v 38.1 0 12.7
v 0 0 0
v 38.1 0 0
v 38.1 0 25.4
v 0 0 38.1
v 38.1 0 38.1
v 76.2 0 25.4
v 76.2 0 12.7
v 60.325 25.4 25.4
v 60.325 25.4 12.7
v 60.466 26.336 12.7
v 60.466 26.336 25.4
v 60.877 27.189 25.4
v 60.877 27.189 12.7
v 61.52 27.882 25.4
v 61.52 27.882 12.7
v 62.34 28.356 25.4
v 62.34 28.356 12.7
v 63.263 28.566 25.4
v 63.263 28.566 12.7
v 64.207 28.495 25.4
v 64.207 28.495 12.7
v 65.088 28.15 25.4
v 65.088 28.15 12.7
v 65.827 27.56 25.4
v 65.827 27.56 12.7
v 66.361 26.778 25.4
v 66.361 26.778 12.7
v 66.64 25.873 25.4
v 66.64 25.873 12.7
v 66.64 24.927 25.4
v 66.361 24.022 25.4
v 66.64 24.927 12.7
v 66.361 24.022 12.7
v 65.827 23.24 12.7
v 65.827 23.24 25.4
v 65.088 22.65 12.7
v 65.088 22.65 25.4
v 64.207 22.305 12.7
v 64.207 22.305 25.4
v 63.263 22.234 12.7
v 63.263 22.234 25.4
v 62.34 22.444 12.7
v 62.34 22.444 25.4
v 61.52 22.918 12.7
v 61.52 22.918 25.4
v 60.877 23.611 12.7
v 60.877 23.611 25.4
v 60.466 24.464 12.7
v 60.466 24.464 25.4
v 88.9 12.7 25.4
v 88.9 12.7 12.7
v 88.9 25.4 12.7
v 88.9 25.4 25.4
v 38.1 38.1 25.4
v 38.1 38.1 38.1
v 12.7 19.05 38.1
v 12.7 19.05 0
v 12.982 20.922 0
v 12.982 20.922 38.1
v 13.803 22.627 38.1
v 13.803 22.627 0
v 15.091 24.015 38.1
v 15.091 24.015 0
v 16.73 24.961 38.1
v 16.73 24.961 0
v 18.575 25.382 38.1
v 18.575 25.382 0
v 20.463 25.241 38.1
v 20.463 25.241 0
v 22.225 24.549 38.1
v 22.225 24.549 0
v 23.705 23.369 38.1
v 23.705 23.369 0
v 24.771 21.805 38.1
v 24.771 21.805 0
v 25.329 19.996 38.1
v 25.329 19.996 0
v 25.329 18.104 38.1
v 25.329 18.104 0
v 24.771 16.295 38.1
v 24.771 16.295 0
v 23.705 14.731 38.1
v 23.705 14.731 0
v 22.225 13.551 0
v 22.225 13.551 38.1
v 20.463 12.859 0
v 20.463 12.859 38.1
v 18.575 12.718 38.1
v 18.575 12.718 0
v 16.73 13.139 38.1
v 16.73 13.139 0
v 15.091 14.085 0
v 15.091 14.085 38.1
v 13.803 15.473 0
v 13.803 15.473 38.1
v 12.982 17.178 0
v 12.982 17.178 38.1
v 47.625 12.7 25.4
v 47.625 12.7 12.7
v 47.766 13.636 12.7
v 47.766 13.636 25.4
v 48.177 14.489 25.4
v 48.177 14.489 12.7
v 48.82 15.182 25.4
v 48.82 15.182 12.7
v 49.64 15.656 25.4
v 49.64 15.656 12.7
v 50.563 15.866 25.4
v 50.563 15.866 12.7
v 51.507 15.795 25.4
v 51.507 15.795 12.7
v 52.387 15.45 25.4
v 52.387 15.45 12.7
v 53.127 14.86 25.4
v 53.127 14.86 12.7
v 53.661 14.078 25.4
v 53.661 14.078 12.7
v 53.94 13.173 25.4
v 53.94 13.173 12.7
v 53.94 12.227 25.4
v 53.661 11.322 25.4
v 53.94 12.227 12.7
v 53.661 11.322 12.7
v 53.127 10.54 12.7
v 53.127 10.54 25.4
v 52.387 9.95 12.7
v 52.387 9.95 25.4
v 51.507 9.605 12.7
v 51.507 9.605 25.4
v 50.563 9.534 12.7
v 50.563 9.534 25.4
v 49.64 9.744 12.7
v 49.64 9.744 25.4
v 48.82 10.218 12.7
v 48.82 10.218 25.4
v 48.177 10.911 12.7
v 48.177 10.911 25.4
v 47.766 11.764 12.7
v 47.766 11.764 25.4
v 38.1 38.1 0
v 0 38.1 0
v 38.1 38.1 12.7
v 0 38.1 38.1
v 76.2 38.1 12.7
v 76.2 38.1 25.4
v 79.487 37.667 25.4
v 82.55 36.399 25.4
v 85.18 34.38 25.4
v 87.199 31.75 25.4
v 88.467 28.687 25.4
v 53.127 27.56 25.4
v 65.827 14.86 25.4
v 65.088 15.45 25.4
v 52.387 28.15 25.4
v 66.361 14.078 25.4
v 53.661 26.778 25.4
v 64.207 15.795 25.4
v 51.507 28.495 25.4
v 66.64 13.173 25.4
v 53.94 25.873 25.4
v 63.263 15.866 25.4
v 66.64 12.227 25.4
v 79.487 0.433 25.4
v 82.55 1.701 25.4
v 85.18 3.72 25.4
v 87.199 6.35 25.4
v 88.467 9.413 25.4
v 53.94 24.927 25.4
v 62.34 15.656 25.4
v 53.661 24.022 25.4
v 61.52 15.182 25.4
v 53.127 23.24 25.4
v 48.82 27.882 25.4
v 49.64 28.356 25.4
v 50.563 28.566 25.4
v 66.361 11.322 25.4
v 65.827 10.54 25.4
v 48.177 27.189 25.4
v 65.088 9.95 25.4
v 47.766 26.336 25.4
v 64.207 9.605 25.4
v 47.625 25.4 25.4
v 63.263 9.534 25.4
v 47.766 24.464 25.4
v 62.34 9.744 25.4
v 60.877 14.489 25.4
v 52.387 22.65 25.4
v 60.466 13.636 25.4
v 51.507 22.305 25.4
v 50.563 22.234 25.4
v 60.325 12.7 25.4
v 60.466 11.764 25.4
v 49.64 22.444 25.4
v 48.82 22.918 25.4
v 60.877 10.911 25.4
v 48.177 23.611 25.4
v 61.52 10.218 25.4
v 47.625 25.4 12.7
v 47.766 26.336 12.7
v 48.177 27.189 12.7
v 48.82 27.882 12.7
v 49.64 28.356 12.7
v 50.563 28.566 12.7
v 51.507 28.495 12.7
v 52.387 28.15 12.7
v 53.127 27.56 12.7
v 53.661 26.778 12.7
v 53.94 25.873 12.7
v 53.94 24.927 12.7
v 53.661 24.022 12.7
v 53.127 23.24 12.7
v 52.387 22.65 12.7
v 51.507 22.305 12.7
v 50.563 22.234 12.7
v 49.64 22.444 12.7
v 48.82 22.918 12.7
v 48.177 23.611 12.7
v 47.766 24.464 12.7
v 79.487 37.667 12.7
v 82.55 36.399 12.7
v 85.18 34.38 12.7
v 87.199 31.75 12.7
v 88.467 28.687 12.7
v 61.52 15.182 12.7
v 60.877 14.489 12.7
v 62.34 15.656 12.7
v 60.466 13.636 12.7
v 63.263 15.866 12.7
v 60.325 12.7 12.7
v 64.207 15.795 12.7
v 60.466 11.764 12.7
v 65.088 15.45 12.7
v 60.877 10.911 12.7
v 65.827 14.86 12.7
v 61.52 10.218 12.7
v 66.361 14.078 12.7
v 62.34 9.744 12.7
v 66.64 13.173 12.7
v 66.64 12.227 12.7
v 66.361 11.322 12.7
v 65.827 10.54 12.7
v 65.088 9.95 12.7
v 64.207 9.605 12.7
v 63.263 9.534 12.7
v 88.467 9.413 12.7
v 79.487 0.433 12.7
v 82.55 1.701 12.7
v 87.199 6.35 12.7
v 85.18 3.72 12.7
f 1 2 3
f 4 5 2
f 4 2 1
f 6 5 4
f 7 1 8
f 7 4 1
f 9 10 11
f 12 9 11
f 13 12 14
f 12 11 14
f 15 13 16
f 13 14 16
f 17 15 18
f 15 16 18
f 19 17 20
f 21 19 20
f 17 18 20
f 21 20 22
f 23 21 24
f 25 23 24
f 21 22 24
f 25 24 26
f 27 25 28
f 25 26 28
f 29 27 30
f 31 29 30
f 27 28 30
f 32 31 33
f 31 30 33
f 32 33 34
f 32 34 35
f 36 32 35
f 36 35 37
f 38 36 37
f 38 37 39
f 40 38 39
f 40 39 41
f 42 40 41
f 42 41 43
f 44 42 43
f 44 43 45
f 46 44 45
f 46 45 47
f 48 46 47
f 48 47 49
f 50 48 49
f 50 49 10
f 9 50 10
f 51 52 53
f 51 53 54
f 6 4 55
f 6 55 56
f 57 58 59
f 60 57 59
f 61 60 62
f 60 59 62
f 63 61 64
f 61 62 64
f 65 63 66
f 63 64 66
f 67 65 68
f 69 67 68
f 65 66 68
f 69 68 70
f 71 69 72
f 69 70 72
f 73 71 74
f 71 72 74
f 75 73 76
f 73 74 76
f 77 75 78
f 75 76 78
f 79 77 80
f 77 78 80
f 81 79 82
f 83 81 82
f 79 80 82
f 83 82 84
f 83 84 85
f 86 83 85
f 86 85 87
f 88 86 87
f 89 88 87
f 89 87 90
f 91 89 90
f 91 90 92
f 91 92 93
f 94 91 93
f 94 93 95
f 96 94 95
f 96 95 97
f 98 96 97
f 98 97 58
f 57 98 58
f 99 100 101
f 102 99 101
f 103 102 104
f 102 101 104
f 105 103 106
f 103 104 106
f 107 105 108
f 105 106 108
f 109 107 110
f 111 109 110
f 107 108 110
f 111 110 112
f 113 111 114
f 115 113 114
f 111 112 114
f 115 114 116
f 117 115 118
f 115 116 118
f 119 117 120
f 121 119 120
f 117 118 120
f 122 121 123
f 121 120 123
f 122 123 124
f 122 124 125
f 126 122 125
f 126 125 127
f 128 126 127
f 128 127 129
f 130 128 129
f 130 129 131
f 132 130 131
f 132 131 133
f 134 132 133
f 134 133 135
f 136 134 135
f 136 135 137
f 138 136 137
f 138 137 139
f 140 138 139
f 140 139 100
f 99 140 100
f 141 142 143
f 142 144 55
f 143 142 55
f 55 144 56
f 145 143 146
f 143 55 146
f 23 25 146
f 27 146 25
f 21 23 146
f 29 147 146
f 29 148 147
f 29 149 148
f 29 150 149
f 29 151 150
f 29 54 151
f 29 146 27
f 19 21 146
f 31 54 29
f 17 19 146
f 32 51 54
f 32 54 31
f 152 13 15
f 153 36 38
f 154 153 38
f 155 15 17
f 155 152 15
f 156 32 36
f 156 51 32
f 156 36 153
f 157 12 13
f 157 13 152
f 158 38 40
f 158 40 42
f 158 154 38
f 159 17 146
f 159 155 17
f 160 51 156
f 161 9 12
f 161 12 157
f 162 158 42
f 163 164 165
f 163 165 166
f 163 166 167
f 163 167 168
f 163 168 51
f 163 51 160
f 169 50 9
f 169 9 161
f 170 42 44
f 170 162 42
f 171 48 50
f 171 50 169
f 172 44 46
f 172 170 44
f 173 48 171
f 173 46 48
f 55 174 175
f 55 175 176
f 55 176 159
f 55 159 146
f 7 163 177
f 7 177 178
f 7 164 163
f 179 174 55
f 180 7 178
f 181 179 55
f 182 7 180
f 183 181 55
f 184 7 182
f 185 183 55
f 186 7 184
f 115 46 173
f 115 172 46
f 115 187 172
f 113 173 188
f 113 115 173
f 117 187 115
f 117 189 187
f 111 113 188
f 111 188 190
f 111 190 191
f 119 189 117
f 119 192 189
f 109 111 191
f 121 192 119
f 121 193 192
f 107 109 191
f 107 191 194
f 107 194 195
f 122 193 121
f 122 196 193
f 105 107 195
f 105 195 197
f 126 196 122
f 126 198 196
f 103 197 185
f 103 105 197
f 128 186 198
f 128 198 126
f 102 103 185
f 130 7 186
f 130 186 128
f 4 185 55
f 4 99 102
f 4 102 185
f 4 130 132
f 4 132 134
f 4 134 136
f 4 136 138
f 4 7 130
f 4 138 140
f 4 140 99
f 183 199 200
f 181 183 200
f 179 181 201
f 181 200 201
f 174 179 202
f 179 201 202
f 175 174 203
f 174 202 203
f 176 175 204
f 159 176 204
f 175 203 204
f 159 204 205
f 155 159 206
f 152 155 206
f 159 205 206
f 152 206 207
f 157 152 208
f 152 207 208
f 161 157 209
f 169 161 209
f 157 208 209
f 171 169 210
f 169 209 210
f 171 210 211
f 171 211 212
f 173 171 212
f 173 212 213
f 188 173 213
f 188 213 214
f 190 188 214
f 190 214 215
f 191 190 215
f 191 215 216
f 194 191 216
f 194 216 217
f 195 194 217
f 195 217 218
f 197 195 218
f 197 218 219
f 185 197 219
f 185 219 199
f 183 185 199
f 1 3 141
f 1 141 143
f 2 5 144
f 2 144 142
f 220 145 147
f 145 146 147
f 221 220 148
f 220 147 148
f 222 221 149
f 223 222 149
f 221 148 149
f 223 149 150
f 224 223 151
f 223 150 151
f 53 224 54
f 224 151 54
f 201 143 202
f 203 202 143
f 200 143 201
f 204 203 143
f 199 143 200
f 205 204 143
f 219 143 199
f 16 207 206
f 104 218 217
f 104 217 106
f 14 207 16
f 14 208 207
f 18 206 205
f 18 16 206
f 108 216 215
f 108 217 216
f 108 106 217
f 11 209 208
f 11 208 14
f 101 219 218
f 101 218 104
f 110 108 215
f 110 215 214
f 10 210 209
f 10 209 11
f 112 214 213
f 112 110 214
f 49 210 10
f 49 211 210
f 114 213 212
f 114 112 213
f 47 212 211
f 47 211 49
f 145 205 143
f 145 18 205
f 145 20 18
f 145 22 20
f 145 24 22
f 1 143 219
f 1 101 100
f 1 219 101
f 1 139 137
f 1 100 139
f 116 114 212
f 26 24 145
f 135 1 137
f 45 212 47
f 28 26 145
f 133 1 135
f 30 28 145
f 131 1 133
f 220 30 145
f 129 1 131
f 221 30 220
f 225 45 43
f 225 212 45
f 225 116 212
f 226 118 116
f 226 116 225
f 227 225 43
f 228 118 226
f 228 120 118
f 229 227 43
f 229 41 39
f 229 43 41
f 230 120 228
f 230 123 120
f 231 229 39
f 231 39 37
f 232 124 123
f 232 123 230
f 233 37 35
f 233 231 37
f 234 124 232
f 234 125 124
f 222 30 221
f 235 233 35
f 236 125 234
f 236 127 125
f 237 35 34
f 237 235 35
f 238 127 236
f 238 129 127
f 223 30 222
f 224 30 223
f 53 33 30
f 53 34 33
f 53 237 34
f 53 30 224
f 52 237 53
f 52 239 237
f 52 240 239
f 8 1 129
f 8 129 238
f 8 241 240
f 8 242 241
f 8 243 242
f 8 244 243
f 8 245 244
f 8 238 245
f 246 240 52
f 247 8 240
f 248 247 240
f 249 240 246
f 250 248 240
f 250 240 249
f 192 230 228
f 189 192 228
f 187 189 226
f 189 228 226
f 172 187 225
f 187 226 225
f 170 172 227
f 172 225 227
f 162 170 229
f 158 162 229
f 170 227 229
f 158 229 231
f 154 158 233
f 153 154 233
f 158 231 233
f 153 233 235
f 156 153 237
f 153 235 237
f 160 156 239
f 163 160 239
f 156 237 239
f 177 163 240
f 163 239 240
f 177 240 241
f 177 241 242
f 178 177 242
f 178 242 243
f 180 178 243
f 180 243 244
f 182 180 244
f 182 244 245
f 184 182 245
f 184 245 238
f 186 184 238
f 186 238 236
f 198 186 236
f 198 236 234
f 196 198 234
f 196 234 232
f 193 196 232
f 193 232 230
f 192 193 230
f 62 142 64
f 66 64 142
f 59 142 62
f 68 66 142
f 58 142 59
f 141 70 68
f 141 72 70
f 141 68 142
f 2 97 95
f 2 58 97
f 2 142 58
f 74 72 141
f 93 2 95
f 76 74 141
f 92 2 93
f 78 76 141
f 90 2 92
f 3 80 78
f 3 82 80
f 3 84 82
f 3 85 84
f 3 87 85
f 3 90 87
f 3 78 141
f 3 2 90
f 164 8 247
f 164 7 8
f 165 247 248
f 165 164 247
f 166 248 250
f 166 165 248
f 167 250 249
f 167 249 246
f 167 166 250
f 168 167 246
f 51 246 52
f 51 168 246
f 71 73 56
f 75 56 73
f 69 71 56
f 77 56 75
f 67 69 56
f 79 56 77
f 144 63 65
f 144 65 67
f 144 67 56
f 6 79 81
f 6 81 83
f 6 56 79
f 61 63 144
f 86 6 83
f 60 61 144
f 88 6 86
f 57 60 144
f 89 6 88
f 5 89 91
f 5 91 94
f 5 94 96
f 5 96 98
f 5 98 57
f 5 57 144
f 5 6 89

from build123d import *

# Parameters (mm, degrees)
F1_DEPTH = 38.1
F3_D     = 6.35
F5_D     = 12.7
F6_R     = 12.7


with BuildPart() as f1:
    # F0 (on Front) → F1 (new body)
    with BuildSketch(Plane.XZ):
        Polygon((0, 38.1), (0, 0), (38.1, 0), (38.1, 12.7), (88.9, 12.7), (88.9, 25.4), (38.1, 25.4), (38.1, 38.1), align=None)
    extrude(amount=-F1_DEPTH)

    # F3 (through all)
    with Locations(Plane.XY.offset(25.4)):
        with Locations((50.8, 25.4), (50.8, 12.7), (63.5, 12.7), (63.5, 25.4)):
            Hole(F3_D / 2)

    # F5 (through all)
    with Locations(Plane.XY.offset(38.1)):
        with Locations((19.05, 19.05)):
            Hole(F5_D / 2)

    # F6
    f6_edges = [f1.edges().sort_by_distance(p)[0] for p in [
        (88.9, 0, 19.05),
        (88.9, 38.1, 19.05),
    ]]
    fillet(f6_edges, radius=F6_R)


solid = f1.part
